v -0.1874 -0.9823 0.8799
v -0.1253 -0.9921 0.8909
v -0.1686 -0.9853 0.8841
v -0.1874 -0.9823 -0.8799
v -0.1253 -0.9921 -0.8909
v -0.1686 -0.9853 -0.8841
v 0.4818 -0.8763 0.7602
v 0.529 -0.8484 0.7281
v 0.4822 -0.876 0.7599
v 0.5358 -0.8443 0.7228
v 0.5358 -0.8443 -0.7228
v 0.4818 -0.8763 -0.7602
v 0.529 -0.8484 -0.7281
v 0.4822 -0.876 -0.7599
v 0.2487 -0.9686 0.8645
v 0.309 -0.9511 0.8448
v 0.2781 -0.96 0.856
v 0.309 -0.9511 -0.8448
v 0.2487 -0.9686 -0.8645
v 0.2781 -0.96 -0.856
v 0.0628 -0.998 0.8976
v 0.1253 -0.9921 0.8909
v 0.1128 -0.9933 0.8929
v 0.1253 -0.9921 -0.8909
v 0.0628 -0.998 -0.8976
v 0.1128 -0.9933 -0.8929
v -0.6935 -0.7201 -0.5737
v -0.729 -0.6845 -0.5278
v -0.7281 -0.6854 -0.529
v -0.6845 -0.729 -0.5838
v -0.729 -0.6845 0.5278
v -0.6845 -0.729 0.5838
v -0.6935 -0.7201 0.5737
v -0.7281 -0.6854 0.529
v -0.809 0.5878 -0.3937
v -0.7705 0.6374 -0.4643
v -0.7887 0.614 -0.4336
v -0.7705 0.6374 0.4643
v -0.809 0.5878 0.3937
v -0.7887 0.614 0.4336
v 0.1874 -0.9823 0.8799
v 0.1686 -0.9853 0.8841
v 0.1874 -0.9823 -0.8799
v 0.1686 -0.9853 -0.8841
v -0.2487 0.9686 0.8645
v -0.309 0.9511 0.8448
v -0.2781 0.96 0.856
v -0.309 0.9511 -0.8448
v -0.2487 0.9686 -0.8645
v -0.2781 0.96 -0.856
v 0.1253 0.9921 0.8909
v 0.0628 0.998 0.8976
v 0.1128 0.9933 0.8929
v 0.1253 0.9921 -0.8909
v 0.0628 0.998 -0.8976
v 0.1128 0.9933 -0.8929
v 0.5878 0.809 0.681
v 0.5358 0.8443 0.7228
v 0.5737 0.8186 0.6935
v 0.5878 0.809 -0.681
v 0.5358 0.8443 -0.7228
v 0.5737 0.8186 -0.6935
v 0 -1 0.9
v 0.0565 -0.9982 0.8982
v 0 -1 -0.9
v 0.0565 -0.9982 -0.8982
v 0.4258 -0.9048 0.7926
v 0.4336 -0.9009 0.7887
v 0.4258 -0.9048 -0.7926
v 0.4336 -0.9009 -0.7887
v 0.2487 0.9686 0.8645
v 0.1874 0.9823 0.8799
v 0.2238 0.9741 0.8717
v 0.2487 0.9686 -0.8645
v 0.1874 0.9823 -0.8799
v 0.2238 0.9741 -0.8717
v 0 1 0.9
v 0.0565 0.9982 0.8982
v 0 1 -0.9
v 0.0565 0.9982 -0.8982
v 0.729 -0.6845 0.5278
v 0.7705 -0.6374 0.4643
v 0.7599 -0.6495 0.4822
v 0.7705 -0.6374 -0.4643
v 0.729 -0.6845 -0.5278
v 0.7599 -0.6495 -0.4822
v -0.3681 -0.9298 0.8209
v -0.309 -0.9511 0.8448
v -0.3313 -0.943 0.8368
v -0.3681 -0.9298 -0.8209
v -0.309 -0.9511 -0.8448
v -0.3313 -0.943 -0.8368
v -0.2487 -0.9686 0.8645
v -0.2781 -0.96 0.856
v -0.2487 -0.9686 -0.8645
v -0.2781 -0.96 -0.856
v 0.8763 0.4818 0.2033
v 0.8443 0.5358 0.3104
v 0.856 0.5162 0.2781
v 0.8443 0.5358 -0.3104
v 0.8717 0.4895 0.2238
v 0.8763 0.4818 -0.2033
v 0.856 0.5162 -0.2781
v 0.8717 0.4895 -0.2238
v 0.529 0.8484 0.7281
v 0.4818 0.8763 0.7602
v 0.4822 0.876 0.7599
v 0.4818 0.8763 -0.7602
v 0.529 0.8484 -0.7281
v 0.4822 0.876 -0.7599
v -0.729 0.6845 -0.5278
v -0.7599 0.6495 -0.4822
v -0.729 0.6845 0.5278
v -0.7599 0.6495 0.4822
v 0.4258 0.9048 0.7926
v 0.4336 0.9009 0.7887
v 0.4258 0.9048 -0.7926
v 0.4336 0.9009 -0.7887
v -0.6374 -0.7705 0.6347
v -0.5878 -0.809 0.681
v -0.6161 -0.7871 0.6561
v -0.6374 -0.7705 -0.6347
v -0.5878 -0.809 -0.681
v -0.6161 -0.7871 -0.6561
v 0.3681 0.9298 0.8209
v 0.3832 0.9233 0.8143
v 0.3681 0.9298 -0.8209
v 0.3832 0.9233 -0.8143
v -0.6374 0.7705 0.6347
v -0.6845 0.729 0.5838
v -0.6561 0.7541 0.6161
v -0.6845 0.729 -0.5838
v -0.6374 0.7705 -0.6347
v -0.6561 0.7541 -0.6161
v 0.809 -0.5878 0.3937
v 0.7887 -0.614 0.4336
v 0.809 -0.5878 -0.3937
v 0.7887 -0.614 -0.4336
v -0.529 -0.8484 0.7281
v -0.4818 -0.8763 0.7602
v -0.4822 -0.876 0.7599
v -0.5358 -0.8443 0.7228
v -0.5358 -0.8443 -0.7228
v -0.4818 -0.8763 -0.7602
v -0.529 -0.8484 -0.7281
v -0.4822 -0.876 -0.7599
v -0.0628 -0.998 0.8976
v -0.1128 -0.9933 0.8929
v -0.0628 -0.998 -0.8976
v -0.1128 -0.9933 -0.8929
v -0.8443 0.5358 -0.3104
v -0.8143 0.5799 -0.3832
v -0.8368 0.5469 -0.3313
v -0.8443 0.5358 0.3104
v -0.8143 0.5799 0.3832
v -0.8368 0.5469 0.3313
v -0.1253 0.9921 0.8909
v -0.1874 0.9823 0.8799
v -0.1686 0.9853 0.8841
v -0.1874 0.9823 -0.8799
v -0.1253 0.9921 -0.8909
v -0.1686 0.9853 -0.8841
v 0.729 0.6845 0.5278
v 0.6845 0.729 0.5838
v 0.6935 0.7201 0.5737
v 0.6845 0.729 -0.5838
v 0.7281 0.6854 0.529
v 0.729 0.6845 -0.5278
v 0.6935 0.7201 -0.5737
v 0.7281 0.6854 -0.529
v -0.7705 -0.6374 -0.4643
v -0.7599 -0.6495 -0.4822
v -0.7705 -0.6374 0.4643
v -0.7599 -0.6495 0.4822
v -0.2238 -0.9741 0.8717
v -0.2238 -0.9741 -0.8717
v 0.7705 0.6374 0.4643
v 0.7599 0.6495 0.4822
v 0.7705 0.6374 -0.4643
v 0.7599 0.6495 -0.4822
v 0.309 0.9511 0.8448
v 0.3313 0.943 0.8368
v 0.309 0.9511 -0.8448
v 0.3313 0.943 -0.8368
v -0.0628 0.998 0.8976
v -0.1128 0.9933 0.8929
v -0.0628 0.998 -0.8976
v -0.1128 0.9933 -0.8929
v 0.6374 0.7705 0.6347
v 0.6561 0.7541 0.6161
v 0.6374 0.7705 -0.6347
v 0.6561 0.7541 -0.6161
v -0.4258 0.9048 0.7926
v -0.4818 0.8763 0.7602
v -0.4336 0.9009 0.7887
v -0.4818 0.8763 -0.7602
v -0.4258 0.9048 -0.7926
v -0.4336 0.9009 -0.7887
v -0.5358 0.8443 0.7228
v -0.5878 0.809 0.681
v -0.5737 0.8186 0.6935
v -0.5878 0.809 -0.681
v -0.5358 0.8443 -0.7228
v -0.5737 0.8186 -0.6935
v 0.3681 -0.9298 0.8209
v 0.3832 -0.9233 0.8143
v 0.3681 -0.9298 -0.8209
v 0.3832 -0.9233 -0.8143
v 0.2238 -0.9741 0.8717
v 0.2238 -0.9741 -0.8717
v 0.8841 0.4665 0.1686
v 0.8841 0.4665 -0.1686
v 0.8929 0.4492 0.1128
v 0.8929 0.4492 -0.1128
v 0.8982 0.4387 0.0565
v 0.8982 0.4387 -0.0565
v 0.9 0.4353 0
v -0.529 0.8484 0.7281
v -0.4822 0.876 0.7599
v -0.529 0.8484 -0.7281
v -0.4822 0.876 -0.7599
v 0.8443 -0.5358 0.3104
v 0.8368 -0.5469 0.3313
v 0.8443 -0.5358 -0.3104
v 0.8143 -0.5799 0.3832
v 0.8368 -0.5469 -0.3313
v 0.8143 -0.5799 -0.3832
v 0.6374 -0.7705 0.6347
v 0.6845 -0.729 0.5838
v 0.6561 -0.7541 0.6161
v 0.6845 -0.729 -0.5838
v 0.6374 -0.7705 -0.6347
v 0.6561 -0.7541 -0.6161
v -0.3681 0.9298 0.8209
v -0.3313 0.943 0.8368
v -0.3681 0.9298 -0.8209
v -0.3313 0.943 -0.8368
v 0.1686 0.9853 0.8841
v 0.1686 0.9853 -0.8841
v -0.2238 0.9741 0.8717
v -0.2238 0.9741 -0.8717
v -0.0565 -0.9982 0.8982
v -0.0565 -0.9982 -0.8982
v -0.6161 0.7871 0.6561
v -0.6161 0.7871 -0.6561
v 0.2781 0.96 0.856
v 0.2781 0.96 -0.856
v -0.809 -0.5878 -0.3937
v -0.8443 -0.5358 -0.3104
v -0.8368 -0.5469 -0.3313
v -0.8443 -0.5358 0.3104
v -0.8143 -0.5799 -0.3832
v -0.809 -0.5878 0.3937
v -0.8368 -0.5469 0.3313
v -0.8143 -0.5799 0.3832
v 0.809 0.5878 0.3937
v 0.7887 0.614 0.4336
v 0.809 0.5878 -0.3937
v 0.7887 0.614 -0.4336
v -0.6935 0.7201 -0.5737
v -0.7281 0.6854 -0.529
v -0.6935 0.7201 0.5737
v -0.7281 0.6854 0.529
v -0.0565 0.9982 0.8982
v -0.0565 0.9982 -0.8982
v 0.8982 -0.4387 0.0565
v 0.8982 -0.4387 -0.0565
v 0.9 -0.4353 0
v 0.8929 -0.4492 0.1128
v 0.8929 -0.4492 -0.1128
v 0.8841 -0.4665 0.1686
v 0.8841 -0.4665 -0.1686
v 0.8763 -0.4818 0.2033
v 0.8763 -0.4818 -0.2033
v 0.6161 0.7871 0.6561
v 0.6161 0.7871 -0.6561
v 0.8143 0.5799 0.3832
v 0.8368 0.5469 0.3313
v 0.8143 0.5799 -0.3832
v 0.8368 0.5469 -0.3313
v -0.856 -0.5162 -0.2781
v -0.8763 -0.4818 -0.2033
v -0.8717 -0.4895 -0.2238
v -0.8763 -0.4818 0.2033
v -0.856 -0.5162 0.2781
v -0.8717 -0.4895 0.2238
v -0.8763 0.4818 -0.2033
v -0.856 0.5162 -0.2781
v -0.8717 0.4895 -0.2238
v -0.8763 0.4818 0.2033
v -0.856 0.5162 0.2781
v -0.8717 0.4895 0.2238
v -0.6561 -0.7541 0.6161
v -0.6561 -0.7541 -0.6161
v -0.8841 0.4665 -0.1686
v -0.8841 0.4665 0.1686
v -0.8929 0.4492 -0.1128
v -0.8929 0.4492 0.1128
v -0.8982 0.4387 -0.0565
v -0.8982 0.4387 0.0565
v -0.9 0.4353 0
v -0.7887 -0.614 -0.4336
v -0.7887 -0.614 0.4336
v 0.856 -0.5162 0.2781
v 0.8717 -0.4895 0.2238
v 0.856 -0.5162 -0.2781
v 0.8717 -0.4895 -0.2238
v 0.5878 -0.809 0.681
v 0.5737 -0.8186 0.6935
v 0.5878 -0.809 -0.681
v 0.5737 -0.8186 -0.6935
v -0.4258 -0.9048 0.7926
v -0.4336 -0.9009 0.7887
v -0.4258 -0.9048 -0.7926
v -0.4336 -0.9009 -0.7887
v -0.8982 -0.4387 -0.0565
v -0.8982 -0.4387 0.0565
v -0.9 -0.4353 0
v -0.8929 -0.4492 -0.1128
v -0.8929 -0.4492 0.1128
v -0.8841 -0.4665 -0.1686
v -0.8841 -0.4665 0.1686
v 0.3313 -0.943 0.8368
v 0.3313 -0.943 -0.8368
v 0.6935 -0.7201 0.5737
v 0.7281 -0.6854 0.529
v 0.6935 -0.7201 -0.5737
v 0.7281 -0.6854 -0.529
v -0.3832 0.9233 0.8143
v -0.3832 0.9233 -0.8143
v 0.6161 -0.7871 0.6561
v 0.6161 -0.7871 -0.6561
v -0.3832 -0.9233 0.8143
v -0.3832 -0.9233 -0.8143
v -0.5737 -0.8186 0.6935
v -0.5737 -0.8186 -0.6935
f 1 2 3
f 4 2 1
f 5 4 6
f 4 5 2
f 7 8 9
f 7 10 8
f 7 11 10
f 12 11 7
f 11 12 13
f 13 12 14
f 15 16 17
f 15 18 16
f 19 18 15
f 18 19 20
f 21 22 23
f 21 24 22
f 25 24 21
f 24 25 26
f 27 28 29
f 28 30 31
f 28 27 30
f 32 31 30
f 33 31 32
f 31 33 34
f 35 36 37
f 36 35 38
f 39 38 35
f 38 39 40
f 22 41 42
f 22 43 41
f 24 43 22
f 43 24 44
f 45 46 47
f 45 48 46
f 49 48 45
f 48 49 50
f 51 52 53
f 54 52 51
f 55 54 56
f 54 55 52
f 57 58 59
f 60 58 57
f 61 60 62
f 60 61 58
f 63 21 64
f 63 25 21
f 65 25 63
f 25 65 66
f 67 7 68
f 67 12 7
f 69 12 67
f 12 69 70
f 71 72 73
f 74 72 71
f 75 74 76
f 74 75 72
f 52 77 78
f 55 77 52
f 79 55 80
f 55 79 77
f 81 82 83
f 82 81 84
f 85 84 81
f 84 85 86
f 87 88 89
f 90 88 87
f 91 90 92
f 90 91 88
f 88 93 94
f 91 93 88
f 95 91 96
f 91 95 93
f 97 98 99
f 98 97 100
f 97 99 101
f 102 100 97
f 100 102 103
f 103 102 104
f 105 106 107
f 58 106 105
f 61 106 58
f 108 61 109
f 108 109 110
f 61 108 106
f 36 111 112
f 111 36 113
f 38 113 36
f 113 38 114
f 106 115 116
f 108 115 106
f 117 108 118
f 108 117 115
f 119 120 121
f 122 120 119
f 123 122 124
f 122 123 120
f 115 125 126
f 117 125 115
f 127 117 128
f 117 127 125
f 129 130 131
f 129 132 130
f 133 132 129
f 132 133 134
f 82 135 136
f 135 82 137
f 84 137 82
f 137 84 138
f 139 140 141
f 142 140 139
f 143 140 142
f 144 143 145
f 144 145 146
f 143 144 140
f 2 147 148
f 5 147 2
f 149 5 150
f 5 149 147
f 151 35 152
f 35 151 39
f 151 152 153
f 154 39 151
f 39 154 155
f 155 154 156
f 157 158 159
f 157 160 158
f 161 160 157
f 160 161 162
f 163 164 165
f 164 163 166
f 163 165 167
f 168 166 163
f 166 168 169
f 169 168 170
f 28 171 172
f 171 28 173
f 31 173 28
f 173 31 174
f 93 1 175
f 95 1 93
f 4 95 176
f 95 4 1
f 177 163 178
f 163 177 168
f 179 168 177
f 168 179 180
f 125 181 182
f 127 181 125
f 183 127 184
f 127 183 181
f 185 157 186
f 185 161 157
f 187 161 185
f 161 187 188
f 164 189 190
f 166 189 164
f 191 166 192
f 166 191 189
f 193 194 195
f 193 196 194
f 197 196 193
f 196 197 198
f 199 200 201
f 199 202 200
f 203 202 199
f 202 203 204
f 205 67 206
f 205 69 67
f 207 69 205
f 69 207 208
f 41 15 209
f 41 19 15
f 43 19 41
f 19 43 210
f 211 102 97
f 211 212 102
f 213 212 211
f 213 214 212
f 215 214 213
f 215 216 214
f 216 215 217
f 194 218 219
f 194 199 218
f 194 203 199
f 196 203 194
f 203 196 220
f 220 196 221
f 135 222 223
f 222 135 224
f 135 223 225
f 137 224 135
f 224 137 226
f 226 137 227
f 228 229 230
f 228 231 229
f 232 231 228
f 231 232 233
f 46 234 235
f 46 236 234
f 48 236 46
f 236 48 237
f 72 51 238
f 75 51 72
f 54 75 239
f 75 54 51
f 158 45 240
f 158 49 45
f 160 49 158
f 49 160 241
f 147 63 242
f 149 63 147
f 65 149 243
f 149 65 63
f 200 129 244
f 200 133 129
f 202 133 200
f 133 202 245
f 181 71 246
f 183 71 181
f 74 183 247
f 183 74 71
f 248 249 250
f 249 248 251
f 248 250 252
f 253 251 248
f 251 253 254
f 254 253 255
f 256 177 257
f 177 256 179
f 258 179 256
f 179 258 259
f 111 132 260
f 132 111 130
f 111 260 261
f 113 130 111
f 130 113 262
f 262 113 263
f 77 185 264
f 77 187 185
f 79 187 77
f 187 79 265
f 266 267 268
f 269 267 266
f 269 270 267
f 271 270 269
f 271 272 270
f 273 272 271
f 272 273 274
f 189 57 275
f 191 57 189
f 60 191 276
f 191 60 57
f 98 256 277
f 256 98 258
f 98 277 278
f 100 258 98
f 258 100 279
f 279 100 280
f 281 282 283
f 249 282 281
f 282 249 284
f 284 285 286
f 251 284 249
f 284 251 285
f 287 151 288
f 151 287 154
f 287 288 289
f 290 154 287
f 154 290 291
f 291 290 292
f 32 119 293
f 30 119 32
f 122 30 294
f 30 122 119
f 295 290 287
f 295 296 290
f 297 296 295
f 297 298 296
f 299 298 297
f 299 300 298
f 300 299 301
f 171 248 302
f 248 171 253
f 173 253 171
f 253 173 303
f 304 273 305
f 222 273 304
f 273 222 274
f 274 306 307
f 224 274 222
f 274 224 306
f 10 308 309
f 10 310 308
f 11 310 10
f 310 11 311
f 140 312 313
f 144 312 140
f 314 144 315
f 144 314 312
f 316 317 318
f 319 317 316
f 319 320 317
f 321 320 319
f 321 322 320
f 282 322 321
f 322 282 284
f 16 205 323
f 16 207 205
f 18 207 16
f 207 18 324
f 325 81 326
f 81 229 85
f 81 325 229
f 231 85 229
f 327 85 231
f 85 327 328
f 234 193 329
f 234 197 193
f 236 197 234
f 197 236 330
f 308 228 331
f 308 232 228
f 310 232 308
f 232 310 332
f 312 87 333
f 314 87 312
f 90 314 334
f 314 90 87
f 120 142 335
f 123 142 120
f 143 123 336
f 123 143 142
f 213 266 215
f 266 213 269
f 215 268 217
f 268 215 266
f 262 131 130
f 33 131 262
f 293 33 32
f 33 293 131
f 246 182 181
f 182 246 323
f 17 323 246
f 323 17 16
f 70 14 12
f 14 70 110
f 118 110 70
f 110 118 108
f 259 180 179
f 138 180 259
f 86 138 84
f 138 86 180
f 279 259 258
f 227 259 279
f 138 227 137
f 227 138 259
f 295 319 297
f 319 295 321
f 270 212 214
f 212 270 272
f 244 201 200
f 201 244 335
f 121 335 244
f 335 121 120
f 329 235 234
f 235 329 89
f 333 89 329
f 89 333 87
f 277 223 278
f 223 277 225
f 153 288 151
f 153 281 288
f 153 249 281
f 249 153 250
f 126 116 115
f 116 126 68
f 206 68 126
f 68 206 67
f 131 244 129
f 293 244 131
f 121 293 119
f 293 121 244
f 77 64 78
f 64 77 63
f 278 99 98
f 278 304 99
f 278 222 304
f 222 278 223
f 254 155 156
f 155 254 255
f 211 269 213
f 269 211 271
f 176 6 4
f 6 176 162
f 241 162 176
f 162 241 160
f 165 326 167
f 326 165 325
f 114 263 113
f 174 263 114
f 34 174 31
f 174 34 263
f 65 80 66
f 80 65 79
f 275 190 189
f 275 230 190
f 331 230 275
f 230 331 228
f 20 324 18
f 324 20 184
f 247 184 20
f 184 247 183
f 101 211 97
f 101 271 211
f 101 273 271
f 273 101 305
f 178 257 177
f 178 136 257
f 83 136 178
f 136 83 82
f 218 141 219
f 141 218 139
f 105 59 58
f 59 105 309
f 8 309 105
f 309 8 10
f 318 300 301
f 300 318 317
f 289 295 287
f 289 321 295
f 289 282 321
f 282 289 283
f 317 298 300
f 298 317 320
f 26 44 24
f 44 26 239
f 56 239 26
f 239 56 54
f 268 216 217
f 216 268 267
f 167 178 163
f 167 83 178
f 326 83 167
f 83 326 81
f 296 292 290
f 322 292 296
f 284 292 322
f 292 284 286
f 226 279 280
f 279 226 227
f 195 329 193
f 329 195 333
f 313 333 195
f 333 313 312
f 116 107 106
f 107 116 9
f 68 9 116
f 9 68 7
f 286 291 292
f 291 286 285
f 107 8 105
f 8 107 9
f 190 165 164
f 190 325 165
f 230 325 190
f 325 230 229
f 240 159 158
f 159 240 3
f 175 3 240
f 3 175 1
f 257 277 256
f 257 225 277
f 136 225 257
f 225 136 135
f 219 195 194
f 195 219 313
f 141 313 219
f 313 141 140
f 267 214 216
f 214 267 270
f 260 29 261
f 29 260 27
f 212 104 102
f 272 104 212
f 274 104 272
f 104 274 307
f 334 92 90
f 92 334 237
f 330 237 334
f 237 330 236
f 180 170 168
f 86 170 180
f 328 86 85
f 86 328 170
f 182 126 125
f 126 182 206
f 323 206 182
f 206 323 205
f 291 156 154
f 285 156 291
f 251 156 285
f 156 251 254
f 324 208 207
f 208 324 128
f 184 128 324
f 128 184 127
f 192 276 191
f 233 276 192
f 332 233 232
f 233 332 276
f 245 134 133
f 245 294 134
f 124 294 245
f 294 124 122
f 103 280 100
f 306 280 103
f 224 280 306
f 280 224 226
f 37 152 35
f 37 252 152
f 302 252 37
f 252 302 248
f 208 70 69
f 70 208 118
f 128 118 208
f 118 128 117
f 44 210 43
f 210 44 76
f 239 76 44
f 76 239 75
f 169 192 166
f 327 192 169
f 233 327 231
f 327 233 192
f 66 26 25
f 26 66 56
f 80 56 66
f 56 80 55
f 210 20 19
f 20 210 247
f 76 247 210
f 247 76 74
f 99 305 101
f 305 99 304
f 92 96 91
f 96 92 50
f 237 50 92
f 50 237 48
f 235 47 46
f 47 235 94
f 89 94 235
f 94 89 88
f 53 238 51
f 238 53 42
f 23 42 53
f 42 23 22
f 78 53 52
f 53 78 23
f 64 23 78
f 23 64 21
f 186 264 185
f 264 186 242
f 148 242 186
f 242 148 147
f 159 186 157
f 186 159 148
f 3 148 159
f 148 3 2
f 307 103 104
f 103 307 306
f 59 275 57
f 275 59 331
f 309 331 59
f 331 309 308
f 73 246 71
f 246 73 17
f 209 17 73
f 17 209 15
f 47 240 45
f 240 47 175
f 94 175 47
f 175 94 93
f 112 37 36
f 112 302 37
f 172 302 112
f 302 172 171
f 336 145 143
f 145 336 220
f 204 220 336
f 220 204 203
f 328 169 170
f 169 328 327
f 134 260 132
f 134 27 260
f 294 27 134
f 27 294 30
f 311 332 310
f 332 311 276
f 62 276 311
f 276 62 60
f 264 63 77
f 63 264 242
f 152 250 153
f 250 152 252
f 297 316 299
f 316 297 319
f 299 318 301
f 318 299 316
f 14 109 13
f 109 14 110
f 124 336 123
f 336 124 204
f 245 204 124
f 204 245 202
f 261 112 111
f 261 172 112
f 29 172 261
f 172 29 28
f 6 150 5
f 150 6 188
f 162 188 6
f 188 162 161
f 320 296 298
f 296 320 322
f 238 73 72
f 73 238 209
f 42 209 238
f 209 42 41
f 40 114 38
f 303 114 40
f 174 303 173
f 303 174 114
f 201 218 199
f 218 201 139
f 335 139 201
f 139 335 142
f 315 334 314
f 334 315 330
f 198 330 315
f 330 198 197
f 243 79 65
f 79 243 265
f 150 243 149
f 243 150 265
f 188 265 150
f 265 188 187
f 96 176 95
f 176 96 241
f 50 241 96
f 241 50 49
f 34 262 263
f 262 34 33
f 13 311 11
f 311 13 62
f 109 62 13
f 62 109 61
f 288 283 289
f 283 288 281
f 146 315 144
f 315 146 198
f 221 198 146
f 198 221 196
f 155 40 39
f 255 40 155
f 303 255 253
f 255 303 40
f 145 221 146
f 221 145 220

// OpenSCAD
intersection() {
        cylinder (h = 4, r=1, center = true, $fn=100);
        rotate ([90,0,0]) cylinder (h = 4, r=0.9, center = true, $fn=100);
}

//Union 并集 Difference 差集 intersection 交集
